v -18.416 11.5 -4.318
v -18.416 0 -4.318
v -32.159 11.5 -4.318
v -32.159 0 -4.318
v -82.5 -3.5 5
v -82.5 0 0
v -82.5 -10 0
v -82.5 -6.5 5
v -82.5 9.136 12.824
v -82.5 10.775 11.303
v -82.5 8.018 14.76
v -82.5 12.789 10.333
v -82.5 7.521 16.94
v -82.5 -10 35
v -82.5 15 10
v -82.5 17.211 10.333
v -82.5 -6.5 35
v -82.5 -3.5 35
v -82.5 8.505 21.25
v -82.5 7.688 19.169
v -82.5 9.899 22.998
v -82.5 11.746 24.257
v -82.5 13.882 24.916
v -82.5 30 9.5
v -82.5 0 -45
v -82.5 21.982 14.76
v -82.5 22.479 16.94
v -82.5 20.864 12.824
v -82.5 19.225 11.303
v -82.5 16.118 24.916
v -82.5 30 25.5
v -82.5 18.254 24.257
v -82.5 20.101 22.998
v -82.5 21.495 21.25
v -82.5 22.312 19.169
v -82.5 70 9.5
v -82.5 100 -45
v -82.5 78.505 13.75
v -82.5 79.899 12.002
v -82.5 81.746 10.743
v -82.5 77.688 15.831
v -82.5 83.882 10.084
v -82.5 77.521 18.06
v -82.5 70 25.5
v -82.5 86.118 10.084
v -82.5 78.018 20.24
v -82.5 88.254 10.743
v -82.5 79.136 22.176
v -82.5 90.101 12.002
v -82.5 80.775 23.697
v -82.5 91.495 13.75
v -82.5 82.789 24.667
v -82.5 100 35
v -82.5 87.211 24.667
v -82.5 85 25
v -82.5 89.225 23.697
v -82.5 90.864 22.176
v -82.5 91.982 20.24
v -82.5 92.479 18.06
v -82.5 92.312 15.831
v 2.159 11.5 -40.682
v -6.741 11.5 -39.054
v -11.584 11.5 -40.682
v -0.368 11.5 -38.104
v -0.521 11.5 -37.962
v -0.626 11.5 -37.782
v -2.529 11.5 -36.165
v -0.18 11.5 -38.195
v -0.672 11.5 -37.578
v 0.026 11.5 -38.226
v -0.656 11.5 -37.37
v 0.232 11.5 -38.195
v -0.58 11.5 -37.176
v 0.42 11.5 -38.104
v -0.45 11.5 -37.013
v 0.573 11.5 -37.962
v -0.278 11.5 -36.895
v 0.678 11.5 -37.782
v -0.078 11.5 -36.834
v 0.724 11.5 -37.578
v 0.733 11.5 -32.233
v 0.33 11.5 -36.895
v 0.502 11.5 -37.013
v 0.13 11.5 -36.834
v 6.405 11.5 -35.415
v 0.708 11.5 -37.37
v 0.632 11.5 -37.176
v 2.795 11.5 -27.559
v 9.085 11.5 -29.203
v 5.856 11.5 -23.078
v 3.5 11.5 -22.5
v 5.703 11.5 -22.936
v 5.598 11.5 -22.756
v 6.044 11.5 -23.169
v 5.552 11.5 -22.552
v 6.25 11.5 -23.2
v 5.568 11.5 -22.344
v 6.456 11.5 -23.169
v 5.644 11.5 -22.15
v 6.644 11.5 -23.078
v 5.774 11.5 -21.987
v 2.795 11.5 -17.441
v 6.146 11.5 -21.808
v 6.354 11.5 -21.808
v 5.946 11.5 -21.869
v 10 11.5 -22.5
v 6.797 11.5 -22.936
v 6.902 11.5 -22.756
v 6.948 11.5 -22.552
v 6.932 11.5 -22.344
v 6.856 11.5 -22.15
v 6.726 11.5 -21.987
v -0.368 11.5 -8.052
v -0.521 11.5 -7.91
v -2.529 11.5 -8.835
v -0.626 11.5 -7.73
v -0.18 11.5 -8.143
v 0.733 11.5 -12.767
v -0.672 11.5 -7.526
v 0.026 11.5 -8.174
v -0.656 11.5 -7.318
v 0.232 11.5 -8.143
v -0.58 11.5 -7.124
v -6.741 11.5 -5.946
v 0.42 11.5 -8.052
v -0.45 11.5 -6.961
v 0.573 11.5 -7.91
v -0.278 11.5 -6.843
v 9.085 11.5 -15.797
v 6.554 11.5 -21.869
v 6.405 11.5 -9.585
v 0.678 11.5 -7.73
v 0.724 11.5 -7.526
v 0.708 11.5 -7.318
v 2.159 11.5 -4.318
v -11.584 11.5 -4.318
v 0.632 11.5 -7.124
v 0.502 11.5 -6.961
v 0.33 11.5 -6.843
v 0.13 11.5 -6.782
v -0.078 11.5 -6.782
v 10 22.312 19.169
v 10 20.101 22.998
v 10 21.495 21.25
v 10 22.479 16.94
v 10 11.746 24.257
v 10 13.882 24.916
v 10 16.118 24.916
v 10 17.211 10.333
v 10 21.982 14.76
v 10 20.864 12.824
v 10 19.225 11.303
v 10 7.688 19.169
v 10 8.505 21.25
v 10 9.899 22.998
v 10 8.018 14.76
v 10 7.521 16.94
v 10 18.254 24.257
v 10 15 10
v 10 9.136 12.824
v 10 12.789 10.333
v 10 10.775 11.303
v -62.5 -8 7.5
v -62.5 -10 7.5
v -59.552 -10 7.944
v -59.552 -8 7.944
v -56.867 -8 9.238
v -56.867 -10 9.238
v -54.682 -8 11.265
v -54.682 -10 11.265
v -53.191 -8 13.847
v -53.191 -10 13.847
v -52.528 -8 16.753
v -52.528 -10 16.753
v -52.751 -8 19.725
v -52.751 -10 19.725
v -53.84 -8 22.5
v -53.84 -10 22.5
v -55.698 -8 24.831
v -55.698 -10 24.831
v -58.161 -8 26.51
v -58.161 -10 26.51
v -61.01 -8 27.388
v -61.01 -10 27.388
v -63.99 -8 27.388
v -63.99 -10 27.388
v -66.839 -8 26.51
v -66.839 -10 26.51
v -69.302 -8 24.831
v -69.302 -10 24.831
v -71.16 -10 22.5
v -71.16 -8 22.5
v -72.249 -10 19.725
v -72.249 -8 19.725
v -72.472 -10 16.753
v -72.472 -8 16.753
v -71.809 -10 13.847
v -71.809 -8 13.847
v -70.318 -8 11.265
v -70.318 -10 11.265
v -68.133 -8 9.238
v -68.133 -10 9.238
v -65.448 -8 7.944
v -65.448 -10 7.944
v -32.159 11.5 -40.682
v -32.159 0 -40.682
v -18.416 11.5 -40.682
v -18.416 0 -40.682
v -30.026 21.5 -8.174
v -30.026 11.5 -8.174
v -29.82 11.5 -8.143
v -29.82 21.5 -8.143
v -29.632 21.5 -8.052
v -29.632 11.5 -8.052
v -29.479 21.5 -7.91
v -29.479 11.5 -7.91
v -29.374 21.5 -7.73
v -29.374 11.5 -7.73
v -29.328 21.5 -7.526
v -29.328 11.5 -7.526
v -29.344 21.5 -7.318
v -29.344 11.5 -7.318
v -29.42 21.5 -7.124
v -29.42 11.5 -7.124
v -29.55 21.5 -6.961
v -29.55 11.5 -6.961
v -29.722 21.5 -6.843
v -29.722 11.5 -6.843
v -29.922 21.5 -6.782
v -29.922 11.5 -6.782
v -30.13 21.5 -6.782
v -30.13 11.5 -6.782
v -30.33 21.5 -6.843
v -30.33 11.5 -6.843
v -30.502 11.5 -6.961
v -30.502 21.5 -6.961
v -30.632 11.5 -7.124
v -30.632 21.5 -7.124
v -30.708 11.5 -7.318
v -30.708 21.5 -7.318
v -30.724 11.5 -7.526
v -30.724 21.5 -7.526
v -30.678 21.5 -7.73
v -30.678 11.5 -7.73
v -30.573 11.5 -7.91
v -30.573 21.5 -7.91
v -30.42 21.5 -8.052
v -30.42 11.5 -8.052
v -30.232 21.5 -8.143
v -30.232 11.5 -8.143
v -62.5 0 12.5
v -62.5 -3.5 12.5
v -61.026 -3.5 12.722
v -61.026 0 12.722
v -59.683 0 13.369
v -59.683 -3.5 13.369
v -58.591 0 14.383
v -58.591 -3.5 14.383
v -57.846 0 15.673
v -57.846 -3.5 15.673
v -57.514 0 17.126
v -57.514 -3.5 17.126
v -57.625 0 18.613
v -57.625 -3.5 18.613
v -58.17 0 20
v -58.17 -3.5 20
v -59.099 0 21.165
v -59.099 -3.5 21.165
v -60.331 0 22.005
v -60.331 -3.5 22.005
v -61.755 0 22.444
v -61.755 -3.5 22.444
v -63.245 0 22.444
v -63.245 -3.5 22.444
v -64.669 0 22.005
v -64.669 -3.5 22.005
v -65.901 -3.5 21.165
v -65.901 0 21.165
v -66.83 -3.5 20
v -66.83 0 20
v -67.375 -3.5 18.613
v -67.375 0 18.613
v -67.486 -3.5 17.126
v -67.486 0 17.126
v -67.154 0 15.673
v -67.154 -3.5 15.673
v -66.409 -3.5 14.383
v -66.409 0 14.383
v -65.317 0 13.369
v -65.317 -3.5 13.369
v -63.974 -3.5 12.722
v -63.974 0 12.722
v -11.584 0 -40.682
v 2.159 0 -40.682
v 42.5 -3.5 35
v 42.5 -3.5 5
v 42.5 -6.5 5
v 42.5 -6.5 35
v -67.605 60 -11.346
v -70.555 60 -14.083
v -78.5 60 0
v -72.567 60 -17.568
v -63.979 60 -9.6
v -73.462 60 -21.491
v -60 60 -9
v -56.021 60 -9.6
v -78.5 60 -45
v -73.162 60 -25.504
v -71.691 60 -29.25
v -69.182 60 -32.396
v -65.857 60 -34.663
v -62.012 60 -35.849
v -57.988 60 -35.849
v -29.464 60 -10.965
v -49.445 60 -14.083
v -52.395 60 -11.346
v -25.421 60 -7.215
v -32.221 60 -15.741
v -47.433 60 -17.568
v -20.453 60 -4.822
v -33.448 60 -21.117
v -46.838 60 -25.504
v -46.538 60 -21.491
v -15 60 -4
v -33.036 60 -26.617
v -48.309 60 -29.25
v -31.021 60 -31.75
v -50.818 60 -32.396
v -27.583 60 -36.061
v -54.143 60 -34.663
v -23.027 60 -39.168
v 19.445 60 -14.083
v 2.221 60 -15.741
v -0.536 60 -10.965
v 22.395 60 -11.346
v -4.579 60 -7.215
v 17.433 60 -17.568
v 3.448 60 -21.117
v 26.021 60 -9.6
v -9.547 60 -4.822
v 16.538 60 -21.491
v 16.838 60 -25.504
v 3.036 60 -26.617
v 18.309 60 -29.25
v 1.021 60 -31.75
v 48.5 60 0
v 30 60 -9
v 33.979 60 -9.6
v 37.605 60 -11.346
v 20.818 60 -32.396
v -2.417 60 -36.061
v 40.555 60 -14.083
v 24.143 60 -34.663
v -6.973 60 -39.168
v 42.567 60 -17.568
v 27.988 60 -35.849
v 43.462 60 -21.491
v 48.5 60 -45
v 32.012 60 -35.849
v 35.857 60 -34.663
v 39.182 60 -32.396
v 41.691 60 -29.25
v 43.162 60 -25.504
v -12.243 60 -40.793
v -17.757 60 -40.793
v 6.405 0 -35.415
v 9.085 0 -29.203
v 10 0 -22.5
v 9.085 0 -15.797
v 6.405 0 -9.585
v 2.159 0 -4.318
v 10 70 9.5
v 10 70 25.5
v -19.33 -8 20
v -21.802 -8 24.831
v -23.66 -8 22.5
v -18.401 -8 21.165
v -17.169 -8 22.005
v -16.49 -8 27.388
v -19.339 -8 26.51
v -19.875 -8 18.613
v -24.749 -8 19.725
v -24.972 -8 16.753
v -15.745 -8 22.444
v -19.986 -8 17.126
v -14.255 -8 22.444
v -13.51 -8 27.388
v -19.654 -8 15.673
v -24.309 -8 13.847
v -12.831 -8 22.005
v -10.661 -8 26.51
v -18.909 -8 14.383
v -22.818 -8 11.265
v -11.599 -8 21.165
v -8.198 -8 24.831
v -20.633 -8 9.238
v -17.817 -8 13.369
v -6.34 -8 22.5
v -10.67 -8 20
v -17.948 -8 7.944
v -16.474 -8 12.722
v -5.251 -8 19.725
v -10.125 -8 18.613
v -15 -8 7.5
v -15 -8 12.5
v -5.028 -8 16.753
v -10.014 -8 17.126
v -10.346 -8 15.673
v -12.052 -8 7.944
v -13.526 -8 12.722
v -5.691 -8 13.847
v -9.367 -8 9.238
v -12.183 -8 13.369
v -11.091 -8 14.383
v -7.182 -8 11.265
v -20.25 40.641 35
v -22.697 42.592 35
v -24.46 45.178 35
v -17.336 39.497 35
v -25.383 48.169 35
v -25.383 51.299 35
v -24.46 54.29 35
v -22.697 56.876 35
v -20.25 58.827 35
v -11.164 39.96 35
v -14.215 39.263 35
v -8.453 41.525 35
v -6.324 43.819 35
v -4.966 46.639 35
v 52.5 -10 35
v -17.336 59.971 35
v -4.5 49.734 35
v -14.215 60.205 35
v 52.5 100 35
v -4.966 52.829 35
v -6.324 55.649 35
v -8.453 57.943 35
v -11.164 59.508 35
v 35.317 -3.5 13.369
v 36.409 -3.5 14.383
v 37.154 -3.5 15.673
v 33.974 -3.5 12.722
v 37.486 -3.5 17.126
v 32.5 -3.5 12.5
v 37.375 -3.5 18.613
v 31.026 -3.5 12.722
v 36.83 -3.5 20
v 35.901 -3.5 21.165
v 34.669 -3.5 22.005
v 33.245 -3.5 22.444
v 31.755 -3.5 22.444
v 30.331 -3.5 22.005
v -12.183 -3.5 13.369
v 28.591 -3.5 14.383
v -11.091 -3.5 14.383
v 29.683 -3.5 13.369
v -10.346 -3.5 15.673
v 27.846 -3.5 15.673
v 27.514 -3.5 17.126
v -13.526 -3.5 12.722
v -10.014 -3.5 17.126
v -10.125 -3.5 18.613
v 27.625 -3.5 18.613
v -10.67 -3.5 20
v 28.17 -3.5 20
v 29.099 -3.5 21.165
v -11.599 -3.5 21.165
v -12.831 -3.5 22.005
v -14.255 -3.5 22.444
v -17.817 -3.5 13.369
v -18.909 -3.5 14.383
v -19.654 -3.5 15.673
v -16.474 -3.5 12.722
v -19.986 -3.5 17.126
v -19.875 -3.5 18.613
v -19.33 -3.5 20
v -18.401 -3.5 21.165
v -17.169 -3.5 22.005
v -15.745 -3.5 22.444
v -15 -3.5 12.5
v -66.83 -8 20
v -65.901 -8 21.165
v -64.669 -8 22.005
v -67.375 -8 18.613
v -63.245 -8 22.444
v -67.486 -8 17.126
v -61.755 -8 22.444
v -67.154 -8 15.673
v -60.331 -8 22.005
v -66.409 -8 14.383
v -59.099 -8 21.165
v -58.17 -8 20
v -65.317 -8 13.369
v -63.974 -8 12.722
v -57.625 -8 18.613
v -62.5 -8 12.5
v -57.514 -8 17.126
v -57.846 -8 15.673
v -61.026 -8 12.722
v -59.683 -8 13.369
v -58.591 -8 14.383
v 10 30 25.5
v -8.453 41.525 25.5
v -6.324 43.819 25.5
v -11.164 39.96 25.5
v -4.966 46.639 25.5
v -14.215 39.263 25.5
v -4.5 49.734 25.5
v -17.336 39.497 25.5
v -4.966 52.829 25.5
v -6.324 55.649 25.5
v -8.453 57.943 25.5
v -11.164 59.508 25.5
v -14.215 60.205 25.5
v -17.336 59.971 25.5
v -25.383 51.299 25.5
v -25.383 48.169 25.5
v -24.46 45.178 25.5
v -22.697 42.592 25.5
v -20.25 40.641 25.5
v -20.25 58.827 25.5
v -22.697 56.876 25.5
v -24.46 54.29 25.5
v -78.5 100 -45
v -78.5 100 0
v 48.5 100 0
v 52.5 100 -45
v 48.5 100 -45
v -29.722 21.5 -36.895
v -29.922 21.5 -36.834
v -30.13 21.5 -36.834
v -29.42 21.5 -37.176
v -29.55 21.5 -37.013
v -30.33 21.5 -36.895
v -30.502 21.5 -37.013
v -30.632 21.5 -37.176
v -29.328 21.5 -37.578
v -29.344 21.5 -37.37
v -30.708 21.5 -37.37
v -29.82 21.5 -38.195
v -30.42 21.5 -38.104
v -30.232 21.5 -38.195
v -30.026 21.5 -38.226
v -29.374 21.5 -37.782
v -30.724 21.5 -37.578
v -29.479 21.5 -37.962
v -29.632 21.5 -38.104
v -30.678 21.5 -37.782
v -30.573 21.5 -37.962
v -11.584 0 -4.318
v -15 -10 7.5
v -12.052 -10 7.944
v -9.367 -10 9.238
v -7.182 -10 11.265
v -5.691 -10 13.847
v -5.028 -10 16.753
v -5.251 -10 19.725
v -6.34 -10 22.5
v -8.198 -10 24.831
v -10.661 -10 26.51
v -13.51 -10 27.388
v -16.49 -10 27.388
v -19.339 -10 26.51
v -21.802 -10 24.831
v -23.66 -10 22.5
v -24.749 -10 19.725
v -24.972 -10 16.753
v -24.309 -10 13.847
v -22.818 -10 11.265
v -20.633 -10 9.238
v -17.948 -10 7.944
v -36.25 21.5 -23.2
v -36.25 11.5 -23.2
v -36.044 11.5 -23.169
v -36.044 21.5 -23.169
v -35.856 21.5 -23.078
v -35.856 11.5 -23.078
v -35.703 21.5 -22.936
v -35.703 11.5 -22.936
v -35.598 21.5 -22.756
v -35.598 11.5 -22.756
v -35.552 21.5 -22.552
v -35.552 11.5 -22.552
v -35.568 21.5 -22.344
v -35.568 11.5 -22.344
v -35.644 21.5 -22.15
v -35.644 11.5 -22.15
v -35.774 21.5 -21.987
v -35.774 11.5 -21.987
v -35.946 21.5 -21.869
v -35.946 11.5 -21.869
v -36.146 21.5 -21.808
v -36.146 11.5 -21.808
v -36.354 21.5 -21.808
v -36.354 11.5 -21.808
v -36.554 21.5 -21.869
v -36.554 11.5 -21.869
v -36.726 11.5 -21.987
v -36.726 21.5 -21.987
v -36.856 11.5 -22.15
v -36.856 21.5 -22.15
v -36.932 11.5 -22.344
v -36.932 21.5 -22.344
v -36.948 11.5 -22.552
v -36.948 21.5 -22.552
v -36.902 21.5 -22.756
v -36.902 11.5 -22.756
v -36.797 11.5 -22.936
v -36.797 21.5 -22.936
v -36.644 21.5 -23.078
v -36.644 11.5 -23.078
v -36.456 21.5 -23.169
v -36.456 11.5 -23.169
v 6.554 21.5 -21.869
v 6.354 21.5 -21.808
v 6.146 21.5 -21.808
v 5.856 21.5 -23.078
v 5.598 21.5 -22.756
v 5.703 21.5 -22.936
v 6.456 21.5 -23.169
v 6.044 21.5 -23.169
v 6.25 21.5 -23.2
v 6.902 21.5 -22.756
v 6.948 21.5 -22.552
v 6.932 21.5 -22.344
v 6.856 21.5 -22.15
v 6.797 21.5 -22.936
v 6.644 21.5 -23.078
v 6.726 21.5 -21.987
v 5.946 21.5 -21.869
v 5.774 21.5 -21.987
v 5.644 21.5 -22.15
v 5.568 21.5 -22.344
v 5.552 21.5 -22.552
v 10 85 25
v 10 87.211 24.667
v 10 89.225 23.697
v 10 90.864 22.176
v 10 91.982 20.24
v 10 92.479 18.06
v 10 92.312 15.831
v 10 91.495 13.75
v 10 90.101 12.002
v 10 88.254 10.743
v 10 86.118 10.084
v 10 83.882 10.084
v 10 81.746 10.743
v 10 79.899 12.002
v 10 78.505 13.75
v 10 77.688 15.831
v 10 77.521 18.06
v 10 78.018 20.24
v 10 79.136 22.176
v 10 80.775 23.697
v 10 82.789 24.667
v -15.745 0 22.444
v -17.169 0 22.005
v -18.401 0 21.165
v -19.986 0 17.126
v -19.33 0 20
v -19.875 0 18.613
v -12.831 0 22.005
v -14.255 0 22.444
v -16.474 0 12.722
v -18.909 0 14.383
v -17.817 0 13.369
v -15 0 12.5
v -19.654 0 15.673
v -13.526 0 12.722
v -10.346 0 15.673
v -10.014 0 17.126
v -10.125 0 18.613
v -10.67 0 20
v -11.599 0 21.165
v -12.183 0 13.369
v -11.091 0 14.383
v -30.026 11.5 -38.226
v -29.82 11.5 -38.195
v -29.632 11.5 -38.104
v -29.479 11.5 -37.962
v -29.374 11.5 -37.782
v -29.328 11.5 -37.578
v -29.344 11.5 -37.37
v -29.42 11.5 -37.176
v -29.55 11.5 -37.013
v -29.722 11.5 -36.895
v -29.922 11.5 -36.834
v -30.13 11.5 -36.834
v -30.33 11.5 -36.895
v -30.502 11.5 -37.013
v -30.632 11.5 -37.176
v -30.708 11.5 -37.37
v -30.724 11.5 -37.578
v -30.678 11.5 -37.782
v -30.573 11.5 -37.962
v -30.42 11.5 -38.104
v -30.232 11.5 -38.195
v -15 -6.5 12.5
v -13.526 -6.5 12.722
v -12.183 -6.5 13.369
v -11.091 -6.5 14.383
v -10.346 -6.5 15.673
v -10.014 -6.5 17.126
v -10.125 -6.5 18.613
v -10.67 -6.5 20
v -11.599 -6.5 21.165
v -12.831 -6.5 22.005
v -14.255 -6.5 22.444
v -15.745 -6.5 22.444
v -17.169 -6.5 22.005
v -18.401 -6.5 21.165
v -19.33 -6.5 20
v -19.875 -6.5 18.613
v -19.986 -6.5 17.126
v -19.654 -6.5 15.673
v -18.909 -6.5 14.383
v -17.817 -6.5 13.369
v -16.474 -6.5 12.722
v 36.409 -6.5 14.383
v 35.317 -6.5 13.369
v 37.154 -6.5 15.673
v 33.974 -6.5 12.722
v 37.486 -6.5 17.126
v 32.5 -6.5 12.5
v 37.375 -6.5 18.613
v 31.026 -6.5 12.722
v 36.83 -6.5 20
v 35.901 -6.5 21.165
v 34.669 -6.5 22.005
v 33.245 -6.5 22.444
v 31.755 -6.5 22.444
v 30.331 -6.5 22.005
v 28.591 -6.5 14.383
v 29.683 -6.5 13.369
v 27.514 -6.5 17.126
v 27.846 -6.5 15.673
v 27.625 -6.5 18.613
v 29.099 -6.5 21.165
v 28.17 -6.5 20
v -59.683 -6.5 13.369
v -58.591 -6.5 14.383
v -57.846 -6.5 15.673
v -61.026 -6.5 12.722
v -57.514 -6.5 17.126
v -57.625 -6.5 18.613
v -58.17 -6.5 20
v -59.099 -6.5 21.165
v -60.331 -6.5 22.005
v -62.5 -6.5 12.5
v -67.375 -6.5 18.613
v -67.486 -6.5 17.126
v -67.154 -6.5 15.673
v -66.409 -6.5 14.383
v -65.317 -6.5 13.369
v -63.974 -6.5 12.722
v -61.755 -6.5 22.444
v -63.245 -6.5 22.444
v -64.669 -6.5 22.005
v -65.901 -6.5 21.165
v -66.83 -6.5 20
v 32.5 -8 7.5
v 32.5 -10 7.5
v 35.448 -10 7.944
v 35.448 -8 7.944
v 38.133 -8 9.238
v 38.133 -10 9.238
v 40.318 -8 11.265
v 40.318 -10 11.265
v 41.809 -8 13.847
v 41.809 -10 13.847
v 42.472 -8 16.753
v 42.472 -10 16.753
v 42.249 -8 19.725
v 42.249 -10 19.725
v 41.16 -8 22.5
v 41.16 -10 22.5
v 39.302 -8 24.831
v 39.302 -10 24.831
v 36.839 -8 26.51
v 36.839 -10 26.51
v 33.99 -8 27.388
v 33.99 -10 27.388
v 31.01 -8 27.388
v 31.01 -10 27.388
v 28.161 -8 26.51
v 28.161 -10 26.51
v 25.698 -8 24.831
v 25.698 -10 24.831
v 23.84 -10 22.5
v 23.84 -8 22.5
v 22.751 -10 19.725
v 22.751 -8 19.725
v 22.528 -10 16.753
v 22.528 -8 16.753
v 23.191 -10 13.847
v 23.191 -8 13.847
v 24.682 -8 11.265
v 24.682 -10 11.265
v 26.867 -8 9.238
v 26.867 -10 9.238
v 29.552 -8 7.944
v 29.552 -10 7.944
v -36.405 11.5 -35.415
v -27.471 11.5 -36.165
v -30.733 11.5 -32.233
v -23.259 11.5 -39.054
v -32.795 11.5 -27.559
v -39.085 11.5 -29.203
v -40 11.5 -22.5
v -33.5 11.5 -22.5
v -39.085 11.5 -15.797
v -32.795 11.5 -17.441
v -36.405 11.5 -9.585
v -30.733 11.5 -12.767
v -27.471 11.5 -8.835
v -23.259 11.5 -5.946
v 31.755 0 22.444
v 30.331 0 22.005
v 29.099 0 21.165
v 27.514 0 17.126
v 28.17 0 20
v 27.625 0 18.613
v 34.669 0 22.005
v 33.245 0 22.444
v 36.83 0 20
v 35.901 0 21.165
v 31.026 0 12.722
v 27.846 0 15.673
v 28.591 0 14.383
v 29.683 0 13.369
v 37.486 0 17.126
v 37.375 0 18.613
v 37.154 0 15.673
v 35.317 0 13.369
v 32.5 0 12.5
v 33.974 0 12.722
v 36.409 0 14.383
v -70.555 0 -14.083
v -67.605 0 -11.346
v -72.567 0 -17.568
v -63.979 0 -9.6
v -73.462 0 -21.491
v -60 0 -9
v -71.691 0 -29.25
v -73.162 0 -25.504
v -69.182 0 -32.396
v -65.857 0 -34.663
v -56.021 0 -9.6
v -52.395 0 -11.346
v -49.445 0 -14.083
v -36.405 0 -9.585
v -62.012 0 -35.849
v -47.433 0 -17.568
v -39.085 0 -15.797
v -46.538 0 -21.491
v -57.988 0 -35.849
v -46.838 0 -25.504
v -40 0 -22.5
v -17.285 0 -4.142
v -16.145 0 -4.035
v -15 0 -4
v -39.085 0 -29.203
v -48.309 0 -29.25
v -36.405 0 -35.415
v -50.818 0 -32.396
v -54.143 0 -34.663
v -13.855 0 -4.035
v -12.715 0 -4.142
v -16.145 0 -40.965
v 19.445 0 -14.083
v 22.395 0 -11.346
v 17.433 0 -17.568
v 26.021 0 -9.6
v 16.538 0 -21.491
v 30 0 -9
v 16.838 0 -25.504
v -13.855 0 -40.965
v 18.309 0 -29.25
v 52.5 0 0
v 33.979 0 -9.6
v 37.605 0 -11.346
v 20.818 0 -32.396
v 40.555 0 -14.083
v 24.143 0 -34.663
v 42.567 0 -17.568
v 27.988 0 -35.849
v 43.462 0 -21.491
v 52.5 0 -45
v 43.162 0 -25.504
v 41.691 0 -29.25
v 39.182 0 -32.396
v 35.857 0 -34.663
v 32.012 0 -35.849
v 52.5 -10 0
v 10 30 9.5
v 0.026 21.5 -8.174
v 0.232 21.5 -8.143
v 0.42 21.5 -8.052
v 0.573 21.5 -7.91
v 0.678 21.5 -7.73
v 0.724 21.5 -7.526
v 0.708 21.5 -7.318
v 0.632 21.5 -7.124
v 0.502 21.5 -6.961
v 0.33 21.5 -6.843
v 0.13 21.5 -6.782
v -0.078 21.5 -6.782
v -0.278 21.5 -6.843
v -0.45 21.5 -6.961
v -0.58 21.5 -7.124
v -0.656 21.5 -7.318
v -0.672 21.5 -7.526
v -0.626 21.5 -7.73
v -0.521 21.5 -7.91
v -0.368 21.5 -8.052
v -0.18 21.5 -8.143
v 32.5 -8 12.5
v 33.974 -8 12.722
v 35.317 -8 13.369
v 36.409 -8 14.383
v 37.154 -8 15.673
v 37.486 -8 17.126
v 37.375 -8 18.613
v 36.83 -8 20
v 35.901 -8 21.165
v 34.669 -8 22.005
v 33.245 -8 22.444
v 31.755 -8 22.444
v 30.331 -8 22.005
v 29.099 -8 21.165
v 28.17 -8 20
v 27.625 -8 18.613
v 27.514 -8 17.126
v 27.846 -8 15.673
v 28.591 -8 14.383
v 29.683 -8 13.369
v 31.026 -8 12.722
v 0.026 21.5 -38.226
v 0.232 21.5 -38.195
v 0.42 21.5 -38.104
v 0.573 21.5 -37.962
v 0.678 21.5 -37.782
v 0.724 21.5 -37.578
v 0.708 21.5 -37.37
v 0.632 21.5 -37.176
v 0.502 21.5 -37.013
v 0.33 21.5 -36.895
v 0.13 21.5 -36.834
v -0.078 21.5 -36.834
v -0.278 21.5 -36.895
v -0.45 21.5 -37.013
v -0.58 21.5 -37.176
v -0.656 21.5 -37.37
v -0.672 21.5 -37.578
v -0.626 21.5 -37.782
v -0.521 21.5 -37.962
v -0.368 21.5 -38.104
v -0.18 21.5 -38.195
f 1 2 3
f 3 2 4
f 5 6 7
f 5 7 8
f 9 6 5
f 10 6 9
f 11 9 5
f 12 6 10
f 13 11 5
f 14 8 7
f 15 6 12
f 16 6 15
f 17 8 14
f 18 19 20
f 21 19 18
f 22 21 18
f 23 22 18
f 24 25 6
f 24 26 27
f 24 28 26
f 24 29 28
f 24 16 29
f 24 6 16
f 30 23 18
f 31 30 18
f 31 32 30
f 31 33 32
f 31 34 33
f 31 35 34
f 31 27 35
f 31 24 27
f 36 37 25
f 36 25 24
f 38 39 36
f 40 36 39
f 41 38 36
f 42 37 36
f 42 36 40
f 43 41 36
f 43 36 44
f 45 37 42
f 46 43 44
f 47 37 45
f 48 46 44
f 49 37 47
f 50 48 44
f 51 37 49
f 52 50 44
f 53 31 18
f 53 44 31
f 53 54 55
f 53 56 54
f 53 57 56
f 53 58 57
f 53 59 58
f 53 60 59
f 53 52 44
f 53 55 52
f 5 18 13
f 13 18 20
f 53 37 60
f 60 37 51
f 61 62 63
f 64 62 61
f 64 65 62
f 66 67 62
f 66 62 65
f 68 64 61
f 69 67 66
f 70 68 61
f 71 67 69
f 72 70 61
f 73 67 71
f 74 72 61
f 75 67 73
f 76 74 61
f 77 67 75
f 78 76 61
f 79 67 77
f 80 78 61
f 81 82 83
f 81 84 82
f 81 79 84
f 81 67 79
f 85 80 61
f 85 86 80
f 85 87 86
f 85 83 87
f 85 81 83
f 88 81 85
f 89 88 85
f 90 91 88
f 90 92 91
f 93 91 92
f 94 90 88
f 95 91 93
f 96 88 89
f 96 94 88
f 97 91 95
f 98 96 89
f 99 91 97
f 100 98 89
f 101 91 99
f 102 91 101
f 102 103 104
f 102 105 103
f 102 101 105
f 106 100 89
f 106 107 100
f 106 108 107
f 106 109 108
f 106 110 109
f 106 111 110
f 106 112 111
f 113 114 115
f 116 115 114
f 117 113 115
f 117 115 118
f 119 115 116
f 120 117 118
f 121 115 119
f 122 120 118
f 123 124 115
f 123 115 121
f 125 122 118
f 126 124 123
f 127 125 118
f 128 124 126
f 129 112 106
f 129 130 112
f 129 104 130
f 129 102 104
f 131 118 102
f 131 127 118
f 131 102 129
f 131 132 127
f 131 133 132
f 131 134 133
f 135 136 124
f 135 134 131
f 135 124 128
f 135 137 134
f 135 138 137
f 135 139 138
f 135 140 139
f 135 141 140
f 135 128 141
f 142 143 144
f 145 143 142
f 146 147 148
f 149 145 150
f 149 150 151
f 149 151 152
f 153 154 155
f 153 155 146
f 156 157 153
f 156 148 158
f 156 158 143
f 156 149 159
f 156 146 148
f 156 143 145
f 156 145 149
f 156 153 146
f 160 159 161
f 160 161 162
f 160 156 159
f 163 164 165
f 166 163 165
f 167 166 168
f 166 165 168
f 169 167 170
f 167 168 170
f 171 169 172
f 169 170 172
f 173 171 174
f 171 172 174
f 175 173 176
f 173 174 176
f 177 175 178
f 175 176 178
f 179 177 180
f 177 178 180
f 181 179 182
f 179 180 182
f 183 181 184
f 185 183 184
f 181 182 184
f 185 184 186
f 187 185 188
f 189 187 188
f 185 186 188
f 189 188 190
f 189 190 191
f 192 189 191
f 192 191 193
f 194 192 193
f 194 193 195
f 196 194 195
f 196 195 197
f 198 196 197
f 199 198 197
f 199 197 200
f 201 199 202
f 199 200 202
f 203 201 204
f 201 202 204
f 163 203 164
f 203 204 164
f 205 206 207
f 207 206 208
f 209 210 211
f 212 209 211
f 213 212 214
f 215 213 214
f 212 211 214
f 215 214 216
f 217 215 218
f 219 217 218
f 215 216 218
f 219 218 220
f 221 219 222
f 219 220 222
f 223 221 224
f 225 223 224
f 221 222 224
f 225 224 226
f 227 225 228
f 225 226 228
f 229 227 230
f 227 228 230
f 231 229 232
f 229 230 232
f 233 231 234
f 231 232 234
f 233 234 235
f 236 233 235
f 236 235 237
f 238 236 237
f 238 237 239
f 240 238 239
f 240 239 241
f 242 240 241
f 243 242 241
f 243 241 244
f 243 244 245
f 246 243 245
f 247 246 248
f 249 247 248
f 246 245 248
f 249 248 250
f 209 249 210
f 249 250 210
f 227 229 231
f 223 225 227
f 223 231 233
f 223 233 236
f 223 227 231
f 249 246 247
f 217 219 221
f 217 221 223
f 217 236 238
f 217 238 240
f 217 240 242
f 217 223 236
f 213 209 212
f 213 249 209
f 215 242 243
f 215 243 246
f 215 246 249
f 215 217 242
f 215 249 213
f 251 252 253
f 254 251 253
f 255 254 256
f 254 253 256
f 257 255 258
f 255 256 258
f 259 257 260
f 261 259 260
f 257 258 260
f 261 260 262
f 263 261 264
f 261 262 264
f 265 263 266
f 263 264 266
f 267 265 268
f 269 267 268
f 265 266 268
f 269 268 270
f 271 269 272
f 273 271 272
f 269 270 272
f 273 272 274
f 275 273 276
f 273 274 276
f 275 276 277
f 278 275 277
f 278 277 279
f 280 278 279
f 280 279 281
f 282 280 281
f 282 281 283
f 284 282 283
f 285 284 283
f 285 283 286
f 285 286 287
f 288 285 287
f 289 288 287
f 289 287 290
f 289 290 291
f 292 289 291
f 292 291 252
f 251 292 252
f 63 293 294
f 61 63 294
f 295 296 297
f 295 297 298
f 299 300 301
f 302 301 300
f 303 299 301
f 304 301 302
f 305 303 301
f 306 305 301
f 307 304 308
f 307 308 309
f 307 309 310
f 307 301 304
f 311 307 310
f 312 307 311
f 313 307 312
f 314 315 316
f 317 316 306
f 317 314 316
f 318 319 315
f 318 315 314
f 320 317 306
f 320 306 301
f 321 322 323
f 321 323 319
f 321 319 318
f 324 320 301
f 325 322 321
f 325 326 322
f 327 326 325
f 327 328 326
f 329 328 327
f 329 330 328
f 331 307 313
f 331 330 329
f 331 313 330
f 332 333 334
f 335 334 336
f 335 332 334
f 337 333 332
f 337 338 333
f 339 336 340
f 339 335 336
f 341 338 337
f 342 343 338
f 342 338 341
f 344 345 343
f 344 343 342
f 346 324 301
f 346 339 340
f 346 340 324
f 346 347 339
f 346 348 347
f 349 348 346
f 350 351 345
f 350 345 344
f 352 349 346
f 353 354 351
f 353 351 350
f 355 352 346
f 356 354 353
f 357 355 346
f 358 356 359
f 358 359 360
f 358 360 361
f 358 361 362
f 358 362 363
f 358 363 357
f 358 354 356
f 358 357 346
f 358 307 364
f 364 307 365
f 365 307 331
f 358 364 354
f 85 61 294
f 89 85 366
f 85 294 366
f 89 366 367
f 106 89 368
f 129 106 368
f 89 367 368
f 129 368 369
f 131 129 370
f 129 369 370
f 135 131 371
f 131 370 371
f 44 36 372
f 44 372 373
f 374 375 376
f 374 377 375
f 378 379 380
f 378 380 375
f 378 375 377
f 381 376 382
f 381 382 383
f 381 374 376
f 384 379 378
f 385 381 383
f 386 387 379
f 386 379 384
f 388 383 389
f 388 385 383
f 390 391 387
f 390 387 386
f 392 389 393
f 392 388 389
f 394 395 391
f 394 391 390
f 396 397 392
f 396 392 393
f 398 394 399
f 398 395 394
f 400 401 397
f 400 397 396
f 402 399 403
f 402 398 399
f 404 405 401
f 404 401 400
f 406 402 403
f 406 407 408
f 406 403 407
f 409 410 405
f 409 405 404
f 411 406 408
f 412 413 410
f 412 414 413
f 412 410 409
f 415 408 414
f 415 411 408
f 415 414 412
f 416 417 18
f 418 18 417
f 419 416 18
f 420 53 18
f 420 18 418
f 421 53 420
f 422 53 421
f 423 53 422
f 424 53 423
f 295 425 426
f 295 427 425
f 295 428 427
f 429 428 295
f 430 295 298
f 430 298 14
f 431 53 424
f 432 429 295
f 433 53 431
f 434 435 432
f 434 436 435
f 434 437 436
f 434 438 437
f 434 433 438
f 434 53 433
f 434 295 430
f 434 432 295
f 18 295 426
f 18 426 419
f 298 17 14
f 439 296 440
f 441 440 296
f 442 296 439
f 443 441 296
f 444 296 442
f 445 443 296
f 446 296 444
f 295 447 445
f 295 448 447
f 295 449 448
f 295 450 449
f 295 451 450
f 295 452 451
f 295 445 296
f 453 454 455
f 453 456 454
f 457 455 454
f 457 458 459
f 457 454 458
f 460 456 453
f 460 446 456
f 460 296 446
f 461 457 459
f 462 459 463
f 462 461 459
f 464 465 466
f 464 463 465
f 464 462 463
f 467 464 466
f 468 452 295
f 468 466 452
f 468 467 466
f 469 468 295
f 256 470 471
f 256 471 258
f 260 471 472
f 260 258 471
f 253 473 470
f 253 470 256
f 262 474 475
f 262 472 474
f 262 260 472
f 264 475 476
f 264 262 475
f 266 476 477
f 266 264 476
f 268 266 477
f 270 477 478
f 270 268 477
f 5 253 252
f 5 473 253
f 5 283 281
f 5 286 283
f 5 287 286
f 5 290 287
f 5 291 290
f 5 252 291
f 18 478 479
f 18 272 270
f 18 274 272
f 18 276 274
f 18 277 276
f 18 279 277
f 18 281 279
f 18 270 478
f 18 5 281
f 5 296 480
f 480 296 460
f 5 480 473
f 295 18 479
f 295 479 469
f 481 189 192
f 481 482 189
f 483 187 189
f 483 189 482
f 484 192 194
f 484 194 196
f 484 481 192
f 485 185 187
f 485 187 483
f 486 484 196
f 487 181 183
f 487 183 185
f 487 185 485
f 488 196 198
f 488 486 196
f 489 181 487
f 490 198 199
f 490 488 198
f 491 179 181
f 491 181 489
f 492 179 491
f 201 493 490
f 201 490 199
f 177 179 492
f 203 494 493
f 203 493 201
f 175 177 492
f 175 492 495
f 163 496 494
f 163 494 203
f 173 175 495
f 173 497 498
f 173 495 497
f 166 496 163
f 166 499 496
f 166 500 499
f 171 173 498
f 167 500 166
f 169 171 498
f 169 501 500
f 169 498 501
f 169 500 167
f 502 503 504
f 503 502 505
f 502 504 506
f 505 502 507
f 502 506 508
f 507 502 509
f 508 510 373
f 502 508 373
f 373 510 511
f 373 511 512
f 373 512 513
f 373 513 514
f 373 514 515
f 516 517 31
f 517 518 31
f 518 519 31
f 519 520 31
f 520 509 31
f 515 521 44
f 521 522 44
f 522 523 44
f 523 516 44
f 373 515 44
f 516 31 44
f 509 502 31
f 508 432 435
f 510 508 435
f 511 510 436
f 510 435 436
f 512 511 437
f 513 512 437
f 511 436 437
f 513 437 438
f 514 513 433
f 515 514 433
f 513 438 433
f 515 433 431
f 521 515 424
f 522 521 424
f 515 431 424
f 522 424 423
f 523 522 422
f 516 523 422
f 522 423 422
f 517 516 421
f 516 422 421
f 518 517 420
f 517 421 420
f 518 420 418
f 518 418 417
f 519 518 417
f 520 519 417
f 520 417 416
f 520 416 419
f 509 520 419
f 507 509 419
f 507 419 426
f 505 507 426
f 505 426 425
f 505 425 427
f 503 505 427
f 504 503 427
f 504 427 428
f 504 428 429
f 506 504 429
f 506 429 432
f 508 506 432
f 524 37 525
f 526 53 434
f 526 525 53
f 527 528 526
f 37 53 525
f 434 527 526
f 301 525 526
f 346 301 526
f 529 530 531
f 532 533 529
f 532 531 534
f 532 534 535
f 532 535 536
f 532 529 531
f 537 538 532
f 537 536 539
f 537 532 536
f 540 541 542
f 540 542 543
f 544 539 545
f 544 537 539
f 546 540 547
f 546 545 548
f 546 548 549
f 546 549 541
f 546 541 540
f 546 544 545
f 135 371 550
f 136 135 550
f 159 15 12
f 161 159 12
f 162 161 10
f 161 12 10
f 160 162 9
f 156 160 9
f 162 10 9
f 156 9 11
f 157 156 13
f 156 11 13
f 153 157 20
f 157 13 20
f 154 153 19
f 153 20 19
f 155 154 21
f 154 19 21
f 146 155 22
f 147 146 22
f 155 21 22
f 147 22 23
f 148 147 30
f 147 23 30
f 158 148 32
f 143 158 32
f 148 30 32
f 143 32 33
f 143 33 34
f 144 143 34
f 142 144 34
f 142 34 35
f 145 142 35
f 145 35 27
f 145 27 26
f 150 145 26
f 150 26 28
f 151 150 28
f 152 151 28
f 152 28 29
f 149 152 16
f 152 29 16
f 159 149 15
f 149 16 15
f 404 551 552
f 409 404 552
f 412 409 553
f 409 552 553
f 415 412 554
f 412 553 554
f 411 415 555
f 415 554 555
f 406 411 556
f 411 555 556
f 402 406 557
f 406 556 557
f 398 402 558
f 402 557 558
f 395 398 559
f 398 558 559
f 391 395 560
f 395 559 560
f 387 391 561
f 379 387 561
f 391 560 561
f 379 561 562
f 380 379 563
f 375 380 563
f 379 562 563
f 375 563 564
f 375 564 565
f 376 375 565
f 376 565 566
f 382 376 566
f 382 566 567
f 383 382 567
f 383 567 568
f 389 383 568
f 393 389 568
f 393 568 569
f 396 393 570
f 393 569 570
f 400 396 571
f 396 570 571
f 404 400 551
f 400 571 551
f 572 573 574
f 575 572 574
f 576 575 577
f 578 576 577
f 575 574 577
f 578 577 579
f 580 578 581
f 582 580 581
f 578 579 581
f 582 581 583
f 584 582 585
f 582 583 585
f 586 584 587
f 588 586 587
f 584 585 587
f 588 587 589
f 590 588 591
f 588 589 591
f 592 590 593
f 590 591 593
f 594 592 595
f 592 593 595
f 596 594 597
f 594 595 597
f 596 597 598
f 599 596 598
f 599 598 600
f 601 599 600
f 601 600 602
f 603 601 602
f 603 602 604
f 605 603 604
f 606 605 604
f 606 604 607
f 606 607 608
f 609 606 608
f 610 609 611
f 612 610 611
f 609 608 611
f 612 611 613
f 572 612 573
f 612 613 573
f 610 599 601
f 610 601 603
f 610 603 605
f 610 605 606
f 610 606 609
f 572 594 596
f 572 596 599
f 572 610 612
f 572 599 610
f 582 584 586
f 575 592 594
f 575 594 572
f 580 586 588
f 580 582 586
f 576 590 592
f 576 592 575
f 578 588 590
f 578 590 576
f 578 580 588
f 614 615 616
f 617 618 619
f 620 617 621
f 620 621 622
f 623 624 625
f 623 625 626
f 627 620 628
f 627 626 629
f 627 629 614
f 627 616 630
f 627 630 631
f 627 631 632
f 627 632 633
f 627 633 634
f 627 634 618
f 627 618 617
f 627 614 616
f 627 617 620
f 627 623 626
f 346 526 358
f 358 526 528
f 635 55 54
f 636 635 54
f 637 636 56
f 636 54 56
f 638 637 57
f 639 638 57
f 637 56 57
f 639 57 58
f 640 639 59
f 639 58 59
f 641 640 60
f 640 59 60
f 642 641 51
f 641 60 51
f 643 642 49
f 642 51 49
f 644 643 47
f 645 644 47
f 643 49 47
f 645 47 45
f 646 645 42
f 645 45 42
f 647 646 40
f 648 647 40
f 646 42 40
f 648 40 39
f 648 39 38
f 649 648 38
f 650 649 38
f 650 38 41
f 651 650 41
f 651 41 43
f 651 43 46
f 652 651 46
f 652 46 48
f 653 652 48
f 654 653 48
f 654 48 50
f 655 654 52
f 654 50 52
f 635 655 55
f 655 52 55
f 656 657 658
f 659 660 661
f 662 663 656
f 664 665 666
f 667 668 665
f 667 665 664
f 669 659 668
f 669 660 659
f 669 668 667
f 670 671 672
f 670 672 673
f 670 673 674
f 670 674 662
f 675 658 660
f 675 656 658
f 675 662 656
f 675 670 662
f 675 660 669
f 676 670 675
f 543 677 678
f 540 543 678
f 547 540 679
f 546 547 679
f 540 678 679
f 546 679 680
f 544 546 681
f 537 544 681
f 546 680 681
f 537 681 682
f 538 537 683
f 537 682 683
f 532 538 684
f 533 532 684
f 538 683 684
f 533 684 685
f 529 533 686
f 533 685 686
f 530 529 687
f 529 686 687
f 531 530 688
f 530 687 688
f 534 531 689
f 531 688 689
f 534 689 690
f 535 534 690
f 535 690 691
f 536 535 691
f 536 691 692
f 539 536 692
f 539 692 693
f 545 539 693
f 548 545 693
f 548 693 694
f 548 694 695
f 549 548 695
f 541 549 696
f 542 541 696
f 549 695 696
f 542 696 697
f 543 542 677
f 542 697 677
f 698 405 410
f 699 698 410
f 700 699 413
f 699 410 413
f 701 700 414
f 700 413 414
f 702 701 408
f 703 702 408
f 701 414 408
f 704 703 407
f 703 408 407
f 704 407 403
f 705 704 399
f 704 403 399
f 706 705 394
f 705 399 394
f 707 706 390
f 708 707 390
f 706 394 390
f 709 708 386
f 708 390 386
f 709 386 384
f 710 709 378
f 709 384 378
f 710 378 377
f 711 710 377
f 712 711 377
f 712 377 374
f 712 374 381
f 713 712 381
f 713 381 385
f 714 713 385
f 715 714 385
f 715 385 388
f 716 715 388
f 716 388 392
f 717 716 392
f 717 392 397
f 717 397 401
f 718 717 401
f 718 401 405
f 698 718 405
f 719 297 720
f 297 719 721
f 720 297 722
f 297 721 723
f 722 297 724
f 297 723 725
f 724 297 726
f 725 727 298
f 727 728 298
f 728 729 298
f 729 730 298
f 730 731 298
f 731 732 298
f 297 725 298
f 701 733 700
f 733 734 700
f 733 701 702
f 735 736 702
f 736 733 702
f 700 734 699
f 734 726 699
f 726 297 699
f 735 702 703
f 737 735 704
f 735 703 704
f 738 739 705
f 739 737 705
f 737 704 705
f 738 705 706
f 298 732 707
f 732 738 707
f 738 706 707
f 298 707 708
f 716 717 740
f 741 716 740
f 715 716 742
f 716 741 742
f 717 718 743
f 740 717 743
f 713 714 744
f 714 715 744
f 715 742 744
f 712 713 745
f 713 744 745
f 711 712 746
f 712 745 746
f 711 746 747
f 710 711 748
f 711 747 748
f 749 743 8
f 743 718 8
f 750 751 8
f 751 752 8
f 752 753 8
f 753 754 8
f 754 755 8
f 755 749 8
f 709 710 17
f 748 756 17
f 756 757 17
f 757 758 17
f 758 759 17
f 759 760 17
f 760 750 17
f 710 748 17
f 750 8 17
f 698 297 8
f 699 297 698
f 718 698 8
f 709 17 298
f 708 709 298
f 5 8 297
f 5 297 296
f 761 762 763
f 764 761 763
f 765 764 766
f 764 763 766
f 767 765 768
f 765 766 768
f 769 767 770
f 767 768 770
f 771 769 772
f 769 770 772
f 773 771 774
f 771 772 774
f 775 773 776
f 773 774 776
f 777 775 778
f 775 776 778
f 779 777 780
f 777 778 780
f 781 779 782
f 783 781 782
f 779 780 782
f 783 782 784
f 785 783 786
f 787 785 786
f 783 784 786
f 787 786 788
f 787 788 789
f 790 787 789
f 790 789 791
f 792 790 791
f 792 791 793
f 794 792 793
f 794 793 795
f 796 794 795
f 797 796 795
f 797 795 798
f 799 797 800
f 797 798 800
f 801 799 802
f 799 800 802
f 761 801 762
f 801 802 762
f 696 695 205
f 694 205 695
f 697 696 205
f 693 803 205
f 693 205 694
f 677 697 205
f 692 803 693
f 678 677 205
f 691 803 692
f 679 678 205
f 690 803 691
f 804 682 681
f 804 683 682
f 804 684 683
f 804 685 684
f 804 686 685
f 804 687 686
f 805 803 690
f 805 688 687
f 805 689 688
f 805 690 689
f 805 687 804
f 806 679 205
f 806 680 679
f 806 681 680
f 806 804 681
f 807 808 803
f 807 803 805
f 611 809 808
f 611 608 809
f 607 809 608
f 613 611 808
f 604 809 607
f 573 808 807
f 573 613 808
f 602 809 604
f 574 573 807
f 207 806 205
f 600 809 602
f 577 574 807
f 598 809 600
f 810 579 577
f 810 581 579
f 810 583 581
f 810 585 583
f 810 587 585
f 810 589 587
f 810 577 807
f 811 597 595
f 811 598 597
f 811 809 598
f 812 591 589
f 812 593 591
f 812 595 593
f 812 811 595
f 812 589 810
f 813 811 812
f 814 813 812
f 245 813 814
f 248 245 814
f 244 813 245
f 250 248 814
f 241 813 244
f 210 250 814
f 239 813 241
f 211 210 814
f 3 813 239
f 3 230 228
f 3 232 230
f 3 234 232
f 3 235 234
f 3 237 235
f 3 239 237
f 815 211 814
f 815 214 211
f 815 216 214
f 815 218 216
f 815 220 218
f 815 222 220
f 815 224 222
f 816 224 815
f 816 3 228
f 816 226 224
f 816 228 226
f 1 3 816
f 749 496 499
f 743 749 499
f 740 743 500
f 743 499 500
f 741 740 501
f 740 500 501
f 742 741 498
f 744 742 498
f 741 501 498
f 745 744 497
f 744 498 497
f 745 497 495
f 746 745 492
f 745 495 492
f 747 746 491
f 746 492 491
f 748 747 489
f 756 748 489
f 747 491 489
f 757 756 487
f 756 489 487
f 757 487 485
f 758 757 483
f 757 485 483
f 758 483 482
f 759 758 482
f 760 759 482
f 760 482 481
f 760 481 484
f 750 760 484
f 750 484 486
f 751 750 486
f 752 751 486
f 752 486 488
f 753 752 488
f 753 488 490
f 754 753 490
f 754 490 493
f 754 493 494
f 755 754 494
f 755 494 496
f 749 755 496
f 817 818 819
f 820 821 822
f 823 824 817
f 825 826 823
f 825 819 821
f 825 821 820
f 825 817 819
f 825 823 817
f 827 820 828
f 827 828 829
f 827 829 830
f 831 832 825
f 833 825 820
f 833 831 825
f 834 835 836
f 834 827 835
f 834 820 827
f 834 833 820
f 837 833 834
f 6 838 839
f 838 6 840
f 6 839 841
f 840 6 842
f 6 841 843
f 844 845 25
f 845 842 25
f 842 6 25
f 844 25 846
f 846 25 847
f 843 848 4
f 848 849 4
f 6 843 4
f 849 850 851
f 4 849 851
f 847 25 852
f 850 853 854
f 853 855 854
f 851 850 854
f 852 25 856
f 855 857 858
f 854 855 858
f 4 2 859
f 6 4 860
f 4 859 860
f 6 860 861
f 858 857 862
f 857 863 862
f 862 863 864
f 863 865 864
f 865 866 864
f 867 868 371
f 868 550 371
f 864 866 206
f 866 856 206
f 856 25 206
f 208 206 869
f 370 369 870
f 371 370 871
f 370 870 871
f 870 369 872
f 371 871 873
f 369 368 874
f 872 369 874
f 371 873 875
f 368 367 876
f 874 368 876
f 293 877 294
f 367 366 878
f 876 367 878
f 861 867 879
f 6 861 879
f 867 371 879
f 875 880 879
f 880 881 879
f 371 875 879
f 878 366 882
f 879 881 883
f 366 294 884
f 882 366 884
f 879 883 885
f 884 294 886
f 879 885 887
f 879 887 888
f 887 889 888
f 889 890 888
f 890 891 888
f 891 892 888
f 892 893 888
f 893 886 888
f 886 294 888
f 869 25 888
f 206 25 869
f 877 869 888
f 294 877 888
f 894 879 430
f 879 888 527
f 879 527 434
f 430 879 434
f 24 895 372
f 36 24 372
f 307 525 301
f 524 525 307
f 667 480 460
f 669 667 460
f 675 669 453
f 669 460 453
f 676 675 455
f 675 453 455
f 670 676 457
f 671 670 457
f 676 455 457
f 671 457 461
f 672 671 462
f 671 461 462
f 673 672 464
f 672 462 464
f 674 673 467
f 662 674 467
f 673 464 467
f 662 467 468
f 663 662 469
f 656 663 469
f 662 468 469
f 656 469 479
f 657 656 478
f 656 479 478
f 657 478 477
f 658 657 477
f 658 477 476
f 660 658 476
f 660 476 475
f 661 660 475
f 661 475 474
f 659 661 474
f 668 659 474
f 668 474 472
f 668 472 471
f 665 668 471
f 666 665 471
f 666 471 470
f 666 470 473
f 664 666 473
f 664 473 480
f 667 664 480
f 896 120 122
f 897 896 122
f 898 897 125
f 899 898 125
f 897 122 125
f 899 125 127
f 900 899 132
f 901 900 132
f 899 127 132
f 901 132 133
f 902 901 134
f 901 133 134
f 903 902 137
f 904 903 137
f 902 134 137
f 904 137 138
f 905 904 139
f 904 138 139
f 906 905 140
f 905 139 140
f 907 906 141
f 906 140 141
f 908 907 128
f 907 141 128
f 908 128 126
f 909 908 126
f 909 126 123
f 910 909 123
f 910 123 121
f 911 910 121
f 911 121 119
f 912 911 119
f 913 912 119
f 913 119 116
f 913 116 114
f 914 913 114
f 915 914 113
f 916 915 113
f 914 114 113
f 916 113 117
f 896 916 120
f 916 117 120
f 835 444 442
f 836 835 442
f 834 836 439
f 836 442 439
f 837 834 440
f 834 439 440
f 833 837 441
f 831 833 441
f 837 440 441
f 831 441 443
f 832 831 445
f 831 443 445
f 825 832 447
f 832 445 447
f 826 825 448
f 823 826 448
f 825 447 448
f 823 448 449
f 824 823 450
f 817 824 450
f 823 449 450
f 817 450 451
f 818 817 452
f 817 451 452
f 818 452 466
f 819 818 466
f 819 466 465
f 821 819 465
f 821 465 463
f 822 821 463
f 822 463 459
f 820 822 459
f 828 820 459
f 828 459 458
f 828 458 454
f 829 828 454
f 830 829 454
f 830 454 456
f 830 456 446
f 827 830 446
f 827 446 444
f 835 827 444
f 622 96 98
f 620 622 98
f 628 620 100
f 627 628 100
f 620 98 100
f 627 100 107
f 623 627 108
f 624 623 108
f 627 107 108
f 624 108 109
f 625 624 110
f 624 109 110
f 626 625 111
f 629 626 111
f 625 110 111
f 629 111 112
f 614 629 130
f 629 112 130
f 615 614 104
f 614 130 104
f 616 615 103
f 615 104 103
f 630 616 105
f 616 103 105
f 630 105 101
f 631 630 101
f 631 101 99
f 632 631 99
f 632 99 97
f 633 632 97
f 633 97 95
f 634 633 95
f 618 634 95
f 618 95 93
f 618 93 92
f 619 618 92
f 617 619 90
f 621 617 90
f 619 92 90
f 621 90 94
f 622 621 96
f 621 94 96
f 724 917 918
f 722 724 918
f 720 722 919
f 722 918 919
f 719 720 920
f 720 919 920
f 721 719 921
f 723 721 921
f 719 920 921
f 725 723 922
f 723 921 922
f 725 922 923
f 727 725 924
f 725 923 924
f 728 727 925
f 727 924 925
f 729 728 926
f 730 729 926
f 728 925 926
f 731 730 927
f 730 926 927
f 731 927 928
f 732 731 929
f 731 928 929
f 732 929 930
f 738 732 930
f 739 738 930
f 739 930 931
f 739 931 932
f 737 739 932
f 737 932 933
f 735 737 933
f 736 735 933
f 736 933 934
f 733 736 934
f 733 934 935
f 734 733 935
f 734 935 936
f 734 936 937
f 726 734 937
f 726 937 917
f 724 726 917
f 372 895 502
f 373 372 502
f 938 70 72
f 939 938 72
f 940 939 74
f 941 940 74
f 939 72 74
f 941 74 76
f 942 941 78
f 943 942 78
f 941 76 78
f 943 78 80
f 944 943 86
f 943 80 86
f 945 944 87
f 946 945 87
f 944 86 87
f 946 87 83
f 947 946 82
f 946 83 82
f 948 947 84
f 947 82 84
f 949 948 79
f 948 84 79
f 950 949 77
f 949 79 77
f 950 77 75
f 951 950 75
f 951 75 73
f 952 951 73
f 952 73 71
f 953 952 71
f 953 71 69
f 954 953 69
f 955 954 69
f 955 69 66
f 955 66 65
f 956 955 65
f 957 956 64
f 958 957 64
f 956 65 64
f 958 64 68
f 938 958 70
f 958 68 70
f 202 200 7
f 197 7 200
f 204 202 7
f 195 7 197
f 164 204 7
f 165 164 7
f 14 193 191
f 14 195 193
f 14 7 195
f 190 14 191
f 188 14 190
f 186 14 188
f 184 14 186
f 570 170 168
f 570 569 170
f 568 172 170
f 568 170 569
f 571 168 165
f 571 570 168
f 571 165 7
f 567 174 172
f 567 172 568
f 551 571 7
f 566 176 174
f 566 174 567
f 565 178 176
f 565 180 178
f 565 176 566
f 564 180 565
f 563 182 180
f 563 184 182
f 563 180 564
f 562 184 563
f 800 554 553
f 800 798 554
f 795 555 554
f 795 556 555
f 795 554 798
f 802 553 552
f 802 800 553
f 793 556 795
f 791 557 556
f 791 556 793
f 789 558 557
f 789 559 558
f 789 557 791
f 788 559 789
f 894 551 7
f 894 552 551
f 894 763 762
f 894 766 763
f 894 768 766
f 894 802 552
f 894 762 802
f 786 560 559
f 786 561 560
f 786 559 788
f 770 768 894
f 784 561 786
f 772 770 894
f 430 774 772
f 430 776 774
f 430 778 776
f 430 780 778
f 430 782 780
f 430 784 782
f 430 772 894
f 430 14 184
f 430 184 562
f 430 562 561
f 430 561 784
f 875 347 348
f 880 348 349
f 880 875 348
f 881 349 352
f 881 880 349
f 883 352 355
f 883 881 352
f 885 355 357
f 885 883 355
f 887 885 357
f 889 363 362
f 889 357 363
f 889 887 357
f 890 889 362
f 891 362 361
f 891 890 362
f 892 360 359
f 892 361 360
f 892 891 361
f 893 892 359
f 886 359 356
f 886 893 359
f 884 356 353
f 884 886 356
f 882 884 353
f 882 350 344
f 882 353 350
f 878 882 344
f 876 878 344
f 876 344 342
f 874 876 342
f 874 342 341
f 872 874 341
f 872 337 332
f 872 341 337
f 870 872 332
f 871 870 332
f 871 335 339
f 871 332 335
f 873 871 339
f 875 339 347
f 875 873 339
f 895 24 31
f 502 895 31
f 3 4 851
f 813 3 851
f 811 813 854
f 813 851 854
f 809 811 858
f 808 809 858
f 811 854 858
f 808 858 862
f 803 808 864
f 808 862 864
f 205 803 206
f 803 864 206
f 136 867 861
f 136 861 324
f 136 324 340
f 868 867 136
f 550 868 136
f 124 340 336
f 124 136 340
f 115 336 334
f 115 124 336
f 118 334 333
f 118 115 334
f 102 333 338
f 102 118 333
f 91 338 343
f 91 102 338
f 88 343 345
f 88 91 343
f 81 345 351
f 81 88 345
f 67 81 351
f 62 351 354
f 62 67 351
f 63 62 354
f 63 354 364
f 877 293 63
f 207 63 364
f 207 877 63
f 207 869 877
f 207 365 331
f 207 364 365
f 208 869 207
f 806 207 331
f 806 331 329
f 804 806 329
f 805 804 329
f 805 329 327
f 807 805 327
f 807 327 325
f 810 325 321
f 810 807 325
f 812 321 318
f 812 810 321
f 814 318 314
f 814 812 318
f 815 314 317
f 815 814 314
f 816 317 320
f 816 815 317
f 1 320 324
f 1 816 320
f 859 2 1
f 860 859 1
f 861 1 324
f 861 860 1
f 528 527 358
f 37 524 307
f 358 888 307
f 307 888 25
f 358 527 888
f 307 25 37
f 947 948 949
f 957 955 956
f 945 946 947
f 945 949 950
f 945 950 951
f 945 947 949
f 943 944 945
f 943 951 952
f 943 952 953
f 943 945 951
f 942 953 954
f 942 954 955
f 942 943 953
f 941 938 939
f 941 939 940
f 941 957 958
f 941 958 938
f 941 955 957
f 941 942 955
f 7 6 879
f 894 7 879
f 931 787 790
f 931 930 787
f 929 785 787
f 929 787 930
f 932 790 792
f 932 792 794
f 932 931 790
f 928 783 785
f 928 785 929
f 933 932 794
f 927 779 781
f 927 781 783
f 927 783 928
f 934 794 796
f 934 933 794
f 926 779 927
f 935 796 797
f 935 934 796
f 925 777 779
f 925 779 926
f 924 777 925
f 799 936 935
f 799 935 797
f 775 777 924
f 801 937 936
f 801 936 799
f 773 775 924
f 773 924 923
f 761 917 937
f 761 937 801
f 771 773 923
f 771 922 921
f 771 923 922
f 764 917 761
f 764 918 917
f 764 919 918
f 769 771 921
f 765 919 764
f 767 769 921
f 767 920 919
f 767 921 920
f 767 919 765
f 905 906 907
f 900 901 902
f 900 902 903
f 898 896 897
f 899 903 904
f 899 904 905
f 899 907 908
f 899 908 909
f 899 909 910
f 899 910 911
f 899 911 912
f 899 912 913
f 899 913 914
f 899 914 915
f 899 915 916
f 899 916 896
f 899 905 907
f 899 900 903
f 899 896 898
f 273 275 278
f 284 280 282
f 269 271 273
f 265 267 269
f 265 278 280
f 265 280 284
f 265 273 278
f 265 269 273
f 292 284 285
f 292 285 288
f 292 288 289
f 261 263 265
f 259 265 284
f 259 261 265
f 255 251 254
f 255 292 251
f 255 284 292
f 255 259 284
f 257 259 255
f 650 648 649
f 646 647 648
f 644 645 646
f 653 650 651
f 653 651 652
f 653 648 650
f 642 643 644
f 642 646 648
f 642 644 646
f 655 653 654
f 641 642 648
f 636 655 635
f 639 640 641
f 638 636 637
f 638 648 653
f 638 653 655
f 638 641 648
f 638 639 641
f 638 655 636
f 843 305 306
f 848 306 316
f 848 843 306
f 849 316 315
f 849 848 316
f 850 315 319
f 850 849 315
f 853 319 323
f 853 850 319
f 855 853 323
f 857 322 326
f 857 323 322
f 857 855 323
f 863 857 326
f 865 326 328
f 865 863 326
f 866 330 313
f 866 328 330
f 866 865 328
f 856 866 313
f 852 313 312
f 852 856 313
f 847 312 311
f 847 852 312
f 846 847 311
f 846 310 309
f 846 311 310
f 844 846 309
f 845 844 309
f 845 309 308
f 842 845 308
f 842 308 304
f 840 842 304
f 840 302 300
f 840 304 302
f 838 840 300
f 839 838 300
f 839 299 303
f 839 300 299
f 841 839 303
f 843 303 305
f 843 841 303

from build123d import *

# Parameters (mm, degrees)
SKETCH1_R           = 13.5
SKETCH1_R_2         = 18.5
BOSS_EXTRUDE1_DEPTH = 100
CUT_EXTRUDE1_DEPTH  = 11.5
SKETCH4_R           = 0.7
CUT_EXTRUDE2_DEPTH  = 10
SKETCH5_W           = 127
SKETCH5_H           = 47.647991038
CUT_EXTRUDE3_DEPTH  = 40
SKETCH6_R           = 7.5
SKETCH6_W           = 16
SKETCH6_H           = 40
CUT_EXTRUDE4_DEPTH  = 92.5
SKETCH10_R          = 10.5
CUT_EXTRUDE5_DEPTH  = 25.5
SKETCH11_W          = 135
SKETCH11_H          = 35
BOSS_EXTRUDE2_DEPTH = 10
SKETCH12_W          = 31.059733337
SKETCH12_H          = 3
CUT_EXTRUDE6_DEPTH  = 125
SKETCH13_R          = 5
CUT_EXTRUDE8_DEPTH  = 10
SKETCH14_R          = 10
CUT_EXTRUDE9_DEPTH  = 2


with BuildPart() as part:
    # Sketch1 → Boss-Extrude1 (new body)
    with BuildSketch(Plane(origin=(0, 0, 0), x_dir=(1, 0, 0), z_dir=(0, 1, 0))):
        Polygon((-82.5, 0), (-82.5, -35), (52.5, -35), (52.5, 0), (52.5, 45), (-82.5, 45), align=None)
        with Locations(Location((-60, 22.5, 0), (0, 0, 270))):
            Circle(SKETCH1_R, mode=Mode.SUBTRACT)
        with Locations(Location((-15, 22.5, 0), (0, 0, 270))):
            Circle(SKETCH1_R_2, mode=Mode.SUBTRACT)
        with Locations(Location((30, 22.5, 0), (0, 0, 270))):
            Circle(SKETCH1_R, mode=Mode.SUBTRACT)
    extrude(amount=BOSS_EXTRUDE1_DEPTH)

    # Sketch3 → Cut-Extrude1 (cut)
    with BuildSketch(Plane.XZ):
        with BuildLine():
            Line((-32.158714626, -40.681818182), (2.158714626, -40.681818182))
            ThreePointArc((2.158714626, -40.681818182), (10, -22.5), (2.158714626, -4.318181818))
            Line((2.158714626, -4.318181818), (-32.158714626, -4.318181818))
            ThreePointArc((-32.158714626, -4.318181818), (-40, -22.5), (-32.158714626, -40.681818182))
        make_face()
    extrude(amount=-CUT_EXTRUDE1_DEPTH, mode=Mode.SUBTRACT)

    # Sketch4 → Cut-Extrude2 (cut)
    with BuildSketch(Plane.XZ.offset(-11.5)):
        with Locations(Location((-36.25, -22.5, 0), (0, 0, 270))):
            Circle(SKETCH4_R)
        with Locations(Location((-30.0260191, -7.4739809, 0), (0, 0, 270))):
            Circle(SKETCH4_R)
        with Locations(Location((0.0260191, -7.4739809, 0), (0, 0, 270))):
            Circle(SKETCH4_R)
        with Locations(Location((6.25, -22.5, 0), (0, 0, 270))):
            Circle(SKETCH4_R)
        with Locations(Location((0.0260191, -37.5260191, 0), (0, 0, 270))):
            Circle(SKETCH4_R)
        with Locations(Location((-30.0260191, -37.5260191, 0), (0, 0, 270))):
            Circle(SKETCH4_R)
    extrude(amount=-CUT_EXTRUDE2_DEPTH, mode=Mode.SUBTRACT)

    # Sketch5 → Cut-Extrude3 (cut)
    with BuildSketch(Plane(origin=(0, 100, 0), x_dir=(1, 0, 0), z_dir=(0, 1, 0))):
        with Locations((-15, 23.823995519)):
            Rectangle(SKETCH5_W, SKETCH5_H)
    extrude(amount=-CUT_EXTRUDE3_DEPTH, mode=Mode.SUBTRACT)

    # Sketch6 → Cut-Extrude4 (cut)
    with BuildSketch(Plane.ZY.offset(82.5)):
        with Locations((17.5, 85)):
            Circle(SKETCH6_R)
        with Locations(Location((17.5, 15, 0), (0, 0, 180))):
            Circle(SKETCH6_R)
        with Locations((17.5, 50)):
            Rectangle(SKETCH6_W, SKETCH6_H)
    extrude(amount=-CUT_EXTRUDE4_DEPTH, mode=Mode.SUBTRACT)

    # Sketch10 → Cut-Extrude5 (cut)
    with BuildSketch(Plane.XY.offset(35)):
        with Locations((-15, 49.733985677)):
            Circle(SKETCH10_R)
    extrude(amount=-CUT_EXTRUDE5_DEPTH, mode=Mode.SUBTRACT)

    # Sketch11 → Boss-Extrude2 (add)
    with BuildSketch(Plane.XZ):
        with Locations((-15, 17.5)):
            Rectangle(SKETCH11_W, SKETCH11_H)
    extrude(amount=BOSS_EXTRUDE2_DEPTH)

    # Sketch12 → Cut-Extrude6 (cut)
    with BuildSketch(Plane.ZY.offset(82.5)):
        with Locations((20.529866669, -5)):
            Rectangle(SKETCH12_W, SKETCH12_H)
    extrude(amount=-CUT_EXTRUDE6_DEPTH, mode=Mode.SUBTRACT)

    # Sketch13 → Cut-Extrude8 (cut)
    with BuildSketch(Plane.XZ.offset(10)):
        with Locations(Location((-62.5, 17.5, 0), (0, 0, 270))):
            Circle(SKETCH13_R)
        with Locations(Location((32.5, 17.5, 0), (0, 0, 270))):
            Circle(SKETCH13_R)
        with Locations(Location((-15, 17.5, 0), (0, 0, 270))):
            Circle(SKETCH13_R)
    extrude(amount=-CUT_EXTRUDE8_DEPTH, mode=Mode.SUBTRACT)

    # Sketch14 → Cut-Extrude9 (cut)
    with BuildSketch(Plane.XZ.offset(10)):
        with Locations(Location((-62.5, 17.5, 0), (0, 0, 270))):
            Circle(SKETCH14_R)
        with Locations(Location((-15, 17.5, 0), (0, 0, 270))):
            Circle(SKETCH14_R)
        with Locations(Location((32.5, 17.5, 0), (0, 0, 270))):
            Circle(SKETCH14_R)
    extrude(amount=-CUT_EXTRUDE9_DEPTH, mode=Mode.SUBTRACT)


solid = part.part
